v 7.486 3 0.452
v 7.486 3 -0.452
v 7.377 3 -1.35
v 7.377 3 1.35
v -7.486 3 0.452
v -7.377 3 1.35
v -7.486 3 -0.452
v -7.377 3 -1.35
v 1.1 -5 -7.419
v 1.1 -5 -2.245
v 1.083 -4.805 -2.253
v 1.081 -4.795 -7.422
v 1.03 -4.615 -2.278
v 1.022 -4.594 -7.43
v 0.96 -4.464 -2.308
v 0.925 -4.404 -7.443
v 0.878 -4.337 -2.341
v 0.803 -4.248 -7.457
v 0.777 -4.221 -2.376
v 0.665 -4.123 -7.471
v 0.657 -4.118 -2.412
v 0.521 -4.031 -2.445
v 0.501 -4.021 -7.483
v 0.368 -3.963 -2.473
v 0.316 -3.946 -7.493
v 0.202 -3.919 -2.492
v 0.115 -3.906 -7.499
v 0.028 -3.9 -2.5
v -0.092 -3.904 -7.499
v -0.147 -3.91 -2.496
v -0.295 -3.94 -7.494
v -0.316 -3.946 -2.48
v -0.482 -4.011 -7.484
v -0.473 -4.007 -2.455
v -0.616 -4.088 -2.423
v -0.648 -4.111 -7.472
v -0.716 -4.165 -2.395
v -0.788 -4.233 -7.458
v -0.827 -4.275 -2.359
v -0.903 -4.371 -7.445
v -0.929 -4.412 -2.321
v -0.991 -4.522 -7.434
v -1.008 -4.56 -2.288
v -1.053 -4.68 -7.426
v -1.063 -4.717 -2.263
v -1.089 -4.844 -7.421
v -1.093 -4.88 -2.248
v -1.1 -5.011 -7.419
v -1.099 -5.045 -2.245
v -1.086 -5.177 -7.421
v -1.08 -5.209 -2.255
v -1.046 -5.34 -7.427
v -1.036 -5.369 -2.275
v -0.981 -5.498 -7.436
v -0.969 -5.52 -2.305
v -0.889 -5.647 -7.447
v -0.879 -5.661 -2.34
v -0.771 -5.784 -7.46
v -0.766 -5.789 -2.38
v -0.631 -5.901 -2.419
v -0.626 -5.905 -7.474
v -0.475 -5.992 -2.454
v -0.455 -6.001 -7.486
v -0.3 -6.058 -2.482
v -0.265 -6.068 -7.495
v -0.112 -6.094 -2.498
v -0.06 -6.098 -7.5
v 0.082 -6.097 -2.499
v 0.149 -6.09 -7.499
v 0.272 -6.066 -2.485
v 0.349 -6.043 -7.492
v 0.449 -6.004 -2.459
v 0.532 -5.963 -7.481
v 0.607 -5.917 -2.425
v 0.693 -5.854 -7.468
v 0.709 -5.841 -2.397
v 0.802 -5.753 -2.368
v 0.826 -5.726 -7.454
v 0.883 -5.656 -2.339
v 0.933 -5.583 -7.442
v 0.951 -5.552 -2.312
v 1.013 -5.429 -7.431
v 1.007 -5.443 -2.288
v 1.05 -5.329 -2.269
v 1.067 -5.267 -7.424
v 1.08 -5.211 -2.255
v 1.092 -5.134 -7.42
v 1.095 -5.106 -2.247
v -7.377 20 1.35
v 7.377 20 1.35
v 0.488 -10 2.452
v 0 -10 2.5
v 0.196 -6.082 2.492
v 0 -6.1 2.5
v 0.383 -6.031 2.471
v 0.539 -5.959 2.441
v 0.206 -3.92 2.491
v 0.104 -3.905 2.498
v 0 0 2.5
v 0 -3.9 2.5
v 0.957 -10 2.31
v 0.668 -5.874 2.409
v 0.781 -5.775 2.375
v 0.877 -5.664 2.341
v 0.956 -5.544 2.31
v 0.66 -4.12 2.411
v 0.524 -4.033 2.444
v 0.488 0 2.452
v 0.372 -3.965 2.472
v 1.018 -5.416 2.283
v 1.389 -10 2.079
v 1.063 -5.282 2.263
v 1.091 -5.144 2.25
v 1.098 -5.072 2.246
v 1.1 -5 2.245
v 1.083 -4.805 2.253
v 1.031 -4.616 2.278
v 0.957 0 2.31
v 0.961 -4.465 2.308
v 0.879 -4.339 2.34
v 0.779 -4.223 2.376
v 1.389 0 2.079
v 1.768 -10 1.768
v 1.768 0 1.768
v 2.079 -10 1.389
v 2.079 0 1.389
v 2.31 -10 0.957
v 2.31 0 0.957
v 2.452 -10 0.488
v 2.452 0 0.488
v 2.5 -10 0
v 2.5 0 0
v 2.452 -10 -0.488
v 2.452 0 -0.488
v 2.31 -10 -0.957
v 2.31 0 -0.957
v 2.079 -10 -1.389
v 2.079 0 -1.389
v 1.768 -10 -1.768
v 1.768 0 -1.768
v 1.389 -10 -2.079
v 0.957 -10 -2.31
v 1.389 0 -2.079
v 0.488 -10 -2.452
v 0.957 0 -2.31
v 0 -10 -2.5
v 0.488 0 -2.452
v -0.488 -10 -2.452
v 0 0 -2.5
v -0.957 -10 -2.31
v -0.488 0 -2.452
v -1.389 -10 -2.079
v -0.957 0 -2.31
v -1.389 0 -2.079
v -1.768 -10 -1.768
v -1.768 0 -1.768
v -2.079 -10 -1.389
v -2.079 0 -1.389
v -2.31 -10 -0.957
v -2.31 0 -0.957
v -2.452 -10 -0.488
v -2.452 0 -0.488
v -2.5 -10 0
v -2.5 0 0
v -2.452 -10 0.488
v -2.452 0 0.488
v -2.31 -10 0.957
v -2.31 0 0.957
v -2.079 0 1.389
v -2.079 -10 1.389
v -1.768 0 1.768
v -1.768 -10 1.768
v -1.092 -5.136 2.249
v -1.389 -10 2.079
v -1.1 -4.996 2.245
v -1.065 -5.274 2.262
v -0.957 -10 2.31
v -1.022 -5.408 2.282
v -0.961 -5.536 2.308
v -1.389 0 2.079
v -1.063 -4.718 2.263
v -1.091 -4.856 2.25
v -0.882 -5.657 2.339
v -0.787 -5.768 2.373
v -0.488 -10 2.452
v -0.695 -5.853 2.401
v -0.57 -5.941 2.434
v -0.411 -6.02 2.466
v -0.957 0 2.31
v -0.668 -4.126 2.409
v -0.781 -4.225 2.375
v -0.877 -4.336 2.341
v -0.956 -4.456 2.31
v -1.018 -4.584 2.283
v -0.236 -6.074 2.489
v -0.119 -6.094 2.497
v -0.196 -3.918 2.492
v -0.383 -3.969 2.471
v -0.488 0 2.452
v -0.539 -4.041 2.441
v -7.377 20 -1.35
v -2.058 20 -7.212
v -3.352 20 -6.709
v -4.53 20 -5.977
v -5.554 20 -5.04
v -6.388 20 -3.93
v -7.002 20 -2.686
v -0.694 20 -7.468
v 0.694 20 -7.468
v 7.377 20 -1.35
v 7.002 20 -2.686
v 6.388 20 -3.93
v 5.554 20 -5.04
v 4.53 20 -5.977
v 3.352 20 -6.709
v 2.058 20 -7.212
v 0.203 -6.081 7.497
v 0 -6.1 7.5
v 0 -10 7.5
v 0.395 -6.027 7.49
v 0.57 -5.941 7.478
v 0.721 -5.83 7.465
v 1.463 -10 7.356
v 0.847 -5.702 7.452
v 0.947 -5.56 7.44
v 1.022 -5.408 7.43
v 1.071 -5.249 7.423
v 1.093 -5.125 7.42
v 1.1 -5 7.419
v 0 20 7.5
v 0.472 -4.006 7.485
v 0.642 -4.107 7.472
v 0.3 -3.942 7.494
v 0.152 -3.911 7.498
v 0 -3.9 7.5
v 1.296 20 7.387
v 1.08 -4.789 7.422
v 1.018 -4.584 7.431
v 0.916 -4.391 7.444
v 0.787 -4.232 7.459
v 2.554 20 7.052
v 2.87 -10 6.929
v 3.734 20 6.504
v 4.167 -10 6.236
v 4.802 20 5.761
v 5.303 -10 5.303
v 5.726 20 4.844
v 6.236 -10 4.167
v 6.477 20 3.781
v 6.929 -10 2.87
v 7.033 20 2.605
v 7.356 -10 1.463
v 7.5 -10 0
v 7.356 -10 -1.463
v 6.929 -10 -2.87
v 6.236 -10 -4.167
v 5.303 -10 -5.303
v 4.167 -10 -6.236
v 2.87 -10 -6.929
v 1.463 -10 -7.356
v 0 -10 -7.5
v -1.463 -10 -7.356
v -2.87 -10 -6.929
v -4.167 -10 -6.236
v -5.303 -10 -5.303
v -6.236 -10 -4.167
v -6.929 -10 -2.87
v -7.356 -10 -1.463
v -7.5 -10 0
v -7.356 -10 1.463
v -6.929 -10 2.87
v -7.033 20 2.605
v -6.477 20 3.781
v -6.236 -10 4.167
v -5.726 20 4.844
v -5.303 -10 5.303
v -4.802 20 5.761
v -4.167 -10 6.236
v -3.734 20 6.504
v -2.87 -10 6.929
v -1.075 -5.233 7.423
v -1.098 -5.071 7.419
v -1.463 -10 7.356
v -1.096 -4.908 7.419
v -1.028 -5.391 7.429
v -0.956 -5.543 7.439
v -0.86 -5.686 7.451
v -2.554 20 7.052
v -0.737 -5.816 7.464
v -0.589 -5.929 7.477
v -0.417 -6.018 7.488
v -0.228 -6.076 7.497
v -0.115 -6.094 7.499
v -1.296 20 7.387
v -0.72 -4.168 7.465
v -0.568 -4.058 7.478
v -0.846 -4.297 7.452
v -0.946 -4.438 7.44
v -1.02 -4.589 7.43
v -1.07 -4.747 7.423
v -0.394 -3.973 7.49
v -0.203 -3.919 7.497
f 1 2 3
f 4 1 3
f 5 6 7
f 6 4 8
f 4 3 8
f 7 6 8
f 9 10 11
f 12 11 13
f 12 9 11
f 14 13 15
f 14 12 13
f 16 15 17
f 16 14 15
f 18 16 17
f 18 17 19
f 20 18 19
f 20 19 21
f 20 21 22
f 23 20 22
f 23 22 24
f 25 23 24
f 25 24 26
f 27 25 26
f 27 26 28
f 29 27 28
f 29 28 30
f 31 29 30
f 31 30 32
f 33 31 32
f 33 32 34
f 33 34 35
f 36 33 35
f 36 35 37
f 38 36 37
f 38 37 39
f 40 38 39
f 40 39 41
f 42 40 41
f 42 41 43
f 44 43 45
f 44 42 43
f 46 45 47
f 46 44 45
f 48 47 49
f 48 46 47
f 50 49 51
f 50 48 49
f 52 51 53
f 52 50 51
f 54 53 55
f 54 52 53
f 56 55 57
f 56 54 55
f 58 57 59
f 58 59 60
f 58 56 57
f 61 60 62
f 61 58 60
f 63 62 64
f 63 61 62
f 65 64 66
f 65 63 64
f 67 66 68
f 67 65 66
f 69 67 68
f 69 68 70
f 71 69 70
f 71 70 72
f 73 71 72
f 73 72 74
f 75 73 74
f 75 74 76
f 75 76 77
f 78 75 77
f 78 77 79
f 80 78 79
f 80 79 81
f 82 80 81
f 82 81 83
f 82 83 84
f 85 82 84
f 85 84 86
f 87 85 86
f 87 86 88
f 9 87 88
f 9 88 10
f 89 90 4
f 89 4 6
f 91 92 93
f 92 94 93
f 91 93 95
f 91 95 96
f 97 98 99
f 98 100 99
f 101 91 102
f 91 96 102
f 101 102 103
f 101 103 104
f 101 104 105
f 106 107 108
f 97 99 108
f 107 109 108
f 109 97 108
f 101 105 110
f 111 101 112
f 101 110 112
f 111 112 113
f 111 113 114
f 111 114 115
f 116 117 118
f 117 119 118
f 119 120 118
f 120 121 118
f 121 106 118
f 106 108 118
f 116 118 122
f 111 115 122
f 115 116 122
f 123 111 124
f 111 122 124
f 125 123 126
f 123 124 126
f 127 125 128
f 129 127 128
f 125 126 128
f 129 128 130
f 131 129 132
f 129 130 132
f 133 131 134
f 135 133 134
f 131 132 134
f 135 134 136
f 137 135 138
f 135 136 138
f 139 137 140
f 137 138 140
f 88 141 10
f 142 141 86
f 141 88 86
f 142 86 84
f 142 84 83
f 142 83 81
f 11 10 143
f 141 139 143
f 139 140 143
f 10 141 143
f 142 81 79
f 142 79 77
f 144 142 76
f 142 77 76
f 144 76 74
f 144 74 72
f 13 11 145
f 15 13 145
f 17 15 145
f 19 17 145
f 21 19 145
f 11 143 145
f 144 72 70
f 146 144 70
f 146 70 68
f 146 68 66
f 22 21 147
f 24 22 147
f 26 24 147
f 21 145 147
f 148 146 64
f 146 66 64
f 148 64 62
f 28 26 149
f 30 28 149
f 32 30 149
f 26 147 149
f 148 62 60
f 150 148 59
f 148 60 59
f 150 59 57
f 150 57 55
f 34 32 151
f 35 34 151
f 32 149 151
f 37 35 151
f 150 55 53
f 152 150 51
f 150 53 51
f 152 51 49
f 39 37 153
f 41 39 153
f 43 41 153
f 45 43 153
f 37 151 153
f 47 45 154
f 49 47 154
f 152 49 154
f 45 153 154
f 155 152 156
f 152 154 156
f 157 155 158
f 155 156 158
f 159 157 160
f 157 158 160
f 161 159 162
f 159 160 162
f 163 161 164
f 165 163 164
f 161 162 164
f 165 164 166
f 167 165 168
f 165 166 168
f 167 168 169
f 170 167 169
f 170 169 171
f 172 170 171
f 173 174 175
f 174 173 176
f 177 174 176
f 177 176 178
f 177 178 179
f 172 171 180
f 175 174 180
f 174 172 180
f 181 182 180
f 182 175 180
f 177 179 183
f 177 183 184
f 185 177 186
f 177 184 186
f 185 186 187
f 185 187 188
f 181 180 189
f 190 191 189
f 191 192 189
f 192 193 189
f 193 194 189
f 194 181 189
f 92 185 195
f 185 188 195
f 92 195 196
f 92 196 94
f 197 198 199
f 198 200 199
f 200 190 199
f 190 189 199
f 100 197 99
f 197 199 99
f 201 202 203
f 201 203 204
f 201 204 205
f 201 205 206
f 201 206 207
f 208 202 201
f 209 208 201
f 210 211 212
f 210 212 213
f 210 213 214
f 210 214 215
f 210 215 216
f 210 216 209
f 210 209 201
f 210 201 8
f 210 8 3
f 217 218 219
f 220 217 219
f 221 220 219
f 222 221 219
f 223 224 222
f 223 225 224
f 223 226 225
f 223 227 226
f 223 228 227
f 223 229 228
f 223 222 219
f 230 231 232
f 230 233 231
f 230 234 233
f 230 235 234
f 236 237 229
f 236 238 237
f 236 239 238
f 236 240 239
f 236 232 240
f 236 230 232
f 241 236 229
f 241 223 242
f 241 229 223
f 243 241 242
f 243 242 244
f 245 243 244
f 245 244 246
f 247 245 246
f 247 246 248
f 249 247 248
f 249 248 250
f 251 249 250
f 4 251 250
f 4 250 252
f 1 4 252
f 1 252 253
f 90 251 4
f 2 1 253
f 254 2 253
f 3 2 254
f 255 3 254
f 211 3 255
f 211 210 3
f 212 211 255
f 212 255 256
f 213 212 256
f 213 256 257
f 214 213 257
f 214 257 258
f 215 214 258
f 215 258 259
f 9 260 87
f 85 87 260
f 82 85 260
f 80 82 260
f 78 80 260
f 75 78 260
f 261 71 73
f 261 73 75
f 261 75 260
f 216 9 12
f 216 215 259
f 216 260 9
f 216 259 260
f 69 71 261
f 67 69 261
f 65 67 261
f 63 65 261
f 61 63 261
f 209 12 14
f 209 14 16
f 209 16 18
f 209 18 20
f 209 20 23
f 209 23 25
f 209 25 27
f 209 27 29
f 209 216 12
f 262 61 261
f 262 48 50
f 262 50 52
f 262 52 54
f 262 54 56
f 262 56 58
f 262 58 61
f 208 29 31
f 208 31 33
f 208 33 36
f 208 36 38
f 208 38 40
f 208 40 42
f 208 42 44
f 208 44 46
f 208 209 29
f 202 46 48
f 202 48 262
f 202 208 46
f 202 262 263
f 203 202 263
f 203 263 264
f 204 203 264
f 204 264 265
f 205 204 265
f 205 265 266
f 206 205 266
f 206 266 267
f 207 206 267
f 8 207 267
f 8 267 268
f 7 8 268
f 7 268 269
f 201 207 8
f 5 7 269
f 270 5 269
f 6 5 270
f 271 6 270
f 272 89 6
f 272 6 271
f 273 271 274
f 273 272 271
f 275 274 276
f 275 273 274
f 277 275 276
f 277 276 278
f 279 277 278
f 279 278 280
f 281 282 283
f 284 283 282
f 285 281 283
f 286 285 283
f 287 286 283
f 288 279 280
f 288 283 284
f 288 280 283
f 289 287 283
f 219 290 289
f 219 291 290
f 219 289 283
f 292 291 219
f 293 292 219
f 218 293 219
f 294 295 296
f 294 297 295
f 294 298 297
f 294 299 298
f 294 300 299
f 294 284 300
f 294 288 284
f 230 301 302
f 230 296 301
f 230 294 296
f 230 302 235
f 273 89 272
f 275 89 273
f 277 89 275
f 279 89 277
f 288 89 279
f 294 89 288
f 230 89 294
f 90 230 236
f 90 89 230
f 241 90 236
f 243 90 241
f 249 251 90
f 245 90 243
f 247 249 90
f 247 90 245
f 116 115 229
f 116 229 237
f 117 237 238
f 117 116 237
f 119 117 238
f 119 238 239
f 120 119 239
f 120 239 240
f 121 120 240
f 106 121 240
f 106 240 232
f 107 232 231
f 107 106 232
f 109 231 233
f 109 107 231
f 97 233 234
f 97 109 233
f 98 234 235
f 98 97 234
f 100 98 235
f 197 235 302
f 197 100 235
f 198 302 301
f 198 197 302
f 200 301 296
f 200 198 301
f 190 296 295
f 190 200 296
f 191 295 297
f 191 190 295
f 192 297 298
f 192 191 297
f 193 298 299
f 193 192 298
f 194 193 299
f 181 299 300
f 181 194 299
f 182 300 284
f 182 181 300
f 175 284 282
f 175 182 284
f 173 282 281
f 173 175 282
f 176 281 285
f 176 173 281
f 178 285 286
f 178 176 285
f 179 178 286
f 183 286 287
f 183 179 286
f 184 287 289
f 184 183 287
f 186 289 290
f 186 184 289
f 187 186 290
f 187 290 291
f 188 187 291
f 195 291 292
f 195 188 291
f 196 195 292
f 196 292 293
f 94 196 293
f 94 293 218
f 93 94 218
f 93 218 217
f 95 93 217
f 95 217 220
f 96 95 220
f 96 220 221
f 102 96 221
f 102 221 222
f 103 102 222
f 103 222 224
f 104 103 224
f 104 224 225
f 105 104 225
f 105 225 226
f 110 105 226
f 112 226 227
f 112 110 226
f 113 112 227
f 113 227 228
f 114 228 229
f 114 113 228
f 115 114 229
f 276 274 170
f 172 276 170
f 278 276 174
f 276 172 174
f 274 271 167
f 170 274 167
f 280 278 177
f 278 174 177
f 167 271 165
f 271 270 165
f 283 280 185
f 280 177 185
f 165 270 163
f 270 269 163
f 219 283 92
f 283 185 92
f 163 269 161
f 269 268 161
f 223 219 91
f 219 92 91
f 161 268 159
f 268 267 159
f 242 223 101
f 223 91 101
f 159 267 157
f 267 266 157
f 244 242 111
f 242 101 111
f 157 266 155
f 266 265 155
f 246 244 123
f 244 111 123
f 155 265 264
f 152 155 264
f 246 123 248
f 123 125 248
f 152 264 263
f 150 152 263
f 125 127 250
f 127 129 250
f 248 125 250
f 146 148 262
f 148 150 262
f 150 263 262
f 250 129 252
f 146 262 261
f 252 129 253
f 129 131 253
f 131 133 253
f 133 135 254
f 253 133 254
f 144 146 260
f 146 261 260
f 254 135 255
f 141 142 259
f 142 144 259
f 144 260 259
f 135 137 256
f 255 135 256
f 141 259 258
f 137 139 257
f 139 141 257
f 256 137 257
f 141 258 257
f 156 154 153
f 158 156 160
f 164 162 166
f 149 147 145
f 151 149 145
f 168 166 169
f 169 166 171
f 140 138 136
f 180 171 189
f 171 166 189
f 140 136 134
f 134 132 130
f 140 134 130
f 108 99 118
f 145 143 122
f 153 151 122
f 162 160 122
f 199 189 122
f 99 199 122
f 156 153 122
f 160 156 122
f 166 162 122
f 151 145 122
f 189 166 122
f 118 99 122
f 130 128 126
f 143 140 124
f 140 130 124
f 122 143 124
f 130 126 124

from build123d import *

# Parameters (mm, degrees)
SKETCH1_R               = 7.5
SKETCH1_R_2             = 2.5
BOSS_EXTRUDE1_DEPTH     = 10
BOSS_EXTRUDE2_START     = 20
SKETCH1_3_R             = 7.5
BOSS_EXTRUDE2_DEPTH     = 20
CUT_EXTRUDE1_DEPTH      = 17
CUT_EXTRUDE2_DEPTH      = 23.638462845
CUT_EXTRUDE2_DEPTH_BACK = 23.638462845
SKETCH3_R               = 1.1


with BuildPart() as part:
    # Sketch1 → Boss-Extrude1 (new body)
    with BuildSketch(Plane(origin=(0, 0, 0), x_dir=(1, 0, 0), z_dir=(0, 1, 0))):
        Circle(SKETCH1_R)
        Circle(SKETCH1_R_2, mode=Mode.SUBTRACT)
    extrude(amount=-BOSS_EXTRUDE1_DEPTH)

    # Sketch1<3> → Boss-Extrude2 (add)
    with BuildSketch(Plane(origin=(0, 0, 0), x_dir=(1, 0, 0), z_dir=(0, 1, 0)).offset(BOSS_EXTRUDE2_START)):
        Circle(SKETCH1_3_R)
    extrude(amount=-BOSS_EXTRUDE2_DEPTH)

    # Sketch2 → Cut-Extrude1 (cut)
    with BuildSketch(Plane(origin=(0, 20, 0), x_dir=(1, 0, 0), z_dir=(0, 1, 0))):
        with BuildLine():
            Line((-7.377499576, 1.35), (7.377499576, 1.35))
            ThreePointArc((7.377499576, 1.35), (7.5, 0), (7.377499576, -1.35))
            Line((7.377499576, -1.35), (-7.377499576, -1.35))
            ThreePointArc((-7.377499576, -1.35), (-7.5, 0), (-7.377499576, 1.35))
        make_face()
    extrude(amount=-CUT_EXTRUDE1_DEPTH, mode=Mode.SUBTRACT)

    # Sketch3 → Cut-Extrude2 (cut, two sides: drawn at the far end of the back side and taken through both)
    with BuildSketch(Plane.XY.offset(-CUT_EXTRUDE2_DEPTH_BACK)):
        with Locations((0, -5)):
            Circle(SKETCH3_R)
    extrude(amount=CUT_EXTRUDE2_DEPTH + CUT_EXTRUDE2_DEPTH_BACK, mode=Mode.SUBTRACT)


solid = part.part
